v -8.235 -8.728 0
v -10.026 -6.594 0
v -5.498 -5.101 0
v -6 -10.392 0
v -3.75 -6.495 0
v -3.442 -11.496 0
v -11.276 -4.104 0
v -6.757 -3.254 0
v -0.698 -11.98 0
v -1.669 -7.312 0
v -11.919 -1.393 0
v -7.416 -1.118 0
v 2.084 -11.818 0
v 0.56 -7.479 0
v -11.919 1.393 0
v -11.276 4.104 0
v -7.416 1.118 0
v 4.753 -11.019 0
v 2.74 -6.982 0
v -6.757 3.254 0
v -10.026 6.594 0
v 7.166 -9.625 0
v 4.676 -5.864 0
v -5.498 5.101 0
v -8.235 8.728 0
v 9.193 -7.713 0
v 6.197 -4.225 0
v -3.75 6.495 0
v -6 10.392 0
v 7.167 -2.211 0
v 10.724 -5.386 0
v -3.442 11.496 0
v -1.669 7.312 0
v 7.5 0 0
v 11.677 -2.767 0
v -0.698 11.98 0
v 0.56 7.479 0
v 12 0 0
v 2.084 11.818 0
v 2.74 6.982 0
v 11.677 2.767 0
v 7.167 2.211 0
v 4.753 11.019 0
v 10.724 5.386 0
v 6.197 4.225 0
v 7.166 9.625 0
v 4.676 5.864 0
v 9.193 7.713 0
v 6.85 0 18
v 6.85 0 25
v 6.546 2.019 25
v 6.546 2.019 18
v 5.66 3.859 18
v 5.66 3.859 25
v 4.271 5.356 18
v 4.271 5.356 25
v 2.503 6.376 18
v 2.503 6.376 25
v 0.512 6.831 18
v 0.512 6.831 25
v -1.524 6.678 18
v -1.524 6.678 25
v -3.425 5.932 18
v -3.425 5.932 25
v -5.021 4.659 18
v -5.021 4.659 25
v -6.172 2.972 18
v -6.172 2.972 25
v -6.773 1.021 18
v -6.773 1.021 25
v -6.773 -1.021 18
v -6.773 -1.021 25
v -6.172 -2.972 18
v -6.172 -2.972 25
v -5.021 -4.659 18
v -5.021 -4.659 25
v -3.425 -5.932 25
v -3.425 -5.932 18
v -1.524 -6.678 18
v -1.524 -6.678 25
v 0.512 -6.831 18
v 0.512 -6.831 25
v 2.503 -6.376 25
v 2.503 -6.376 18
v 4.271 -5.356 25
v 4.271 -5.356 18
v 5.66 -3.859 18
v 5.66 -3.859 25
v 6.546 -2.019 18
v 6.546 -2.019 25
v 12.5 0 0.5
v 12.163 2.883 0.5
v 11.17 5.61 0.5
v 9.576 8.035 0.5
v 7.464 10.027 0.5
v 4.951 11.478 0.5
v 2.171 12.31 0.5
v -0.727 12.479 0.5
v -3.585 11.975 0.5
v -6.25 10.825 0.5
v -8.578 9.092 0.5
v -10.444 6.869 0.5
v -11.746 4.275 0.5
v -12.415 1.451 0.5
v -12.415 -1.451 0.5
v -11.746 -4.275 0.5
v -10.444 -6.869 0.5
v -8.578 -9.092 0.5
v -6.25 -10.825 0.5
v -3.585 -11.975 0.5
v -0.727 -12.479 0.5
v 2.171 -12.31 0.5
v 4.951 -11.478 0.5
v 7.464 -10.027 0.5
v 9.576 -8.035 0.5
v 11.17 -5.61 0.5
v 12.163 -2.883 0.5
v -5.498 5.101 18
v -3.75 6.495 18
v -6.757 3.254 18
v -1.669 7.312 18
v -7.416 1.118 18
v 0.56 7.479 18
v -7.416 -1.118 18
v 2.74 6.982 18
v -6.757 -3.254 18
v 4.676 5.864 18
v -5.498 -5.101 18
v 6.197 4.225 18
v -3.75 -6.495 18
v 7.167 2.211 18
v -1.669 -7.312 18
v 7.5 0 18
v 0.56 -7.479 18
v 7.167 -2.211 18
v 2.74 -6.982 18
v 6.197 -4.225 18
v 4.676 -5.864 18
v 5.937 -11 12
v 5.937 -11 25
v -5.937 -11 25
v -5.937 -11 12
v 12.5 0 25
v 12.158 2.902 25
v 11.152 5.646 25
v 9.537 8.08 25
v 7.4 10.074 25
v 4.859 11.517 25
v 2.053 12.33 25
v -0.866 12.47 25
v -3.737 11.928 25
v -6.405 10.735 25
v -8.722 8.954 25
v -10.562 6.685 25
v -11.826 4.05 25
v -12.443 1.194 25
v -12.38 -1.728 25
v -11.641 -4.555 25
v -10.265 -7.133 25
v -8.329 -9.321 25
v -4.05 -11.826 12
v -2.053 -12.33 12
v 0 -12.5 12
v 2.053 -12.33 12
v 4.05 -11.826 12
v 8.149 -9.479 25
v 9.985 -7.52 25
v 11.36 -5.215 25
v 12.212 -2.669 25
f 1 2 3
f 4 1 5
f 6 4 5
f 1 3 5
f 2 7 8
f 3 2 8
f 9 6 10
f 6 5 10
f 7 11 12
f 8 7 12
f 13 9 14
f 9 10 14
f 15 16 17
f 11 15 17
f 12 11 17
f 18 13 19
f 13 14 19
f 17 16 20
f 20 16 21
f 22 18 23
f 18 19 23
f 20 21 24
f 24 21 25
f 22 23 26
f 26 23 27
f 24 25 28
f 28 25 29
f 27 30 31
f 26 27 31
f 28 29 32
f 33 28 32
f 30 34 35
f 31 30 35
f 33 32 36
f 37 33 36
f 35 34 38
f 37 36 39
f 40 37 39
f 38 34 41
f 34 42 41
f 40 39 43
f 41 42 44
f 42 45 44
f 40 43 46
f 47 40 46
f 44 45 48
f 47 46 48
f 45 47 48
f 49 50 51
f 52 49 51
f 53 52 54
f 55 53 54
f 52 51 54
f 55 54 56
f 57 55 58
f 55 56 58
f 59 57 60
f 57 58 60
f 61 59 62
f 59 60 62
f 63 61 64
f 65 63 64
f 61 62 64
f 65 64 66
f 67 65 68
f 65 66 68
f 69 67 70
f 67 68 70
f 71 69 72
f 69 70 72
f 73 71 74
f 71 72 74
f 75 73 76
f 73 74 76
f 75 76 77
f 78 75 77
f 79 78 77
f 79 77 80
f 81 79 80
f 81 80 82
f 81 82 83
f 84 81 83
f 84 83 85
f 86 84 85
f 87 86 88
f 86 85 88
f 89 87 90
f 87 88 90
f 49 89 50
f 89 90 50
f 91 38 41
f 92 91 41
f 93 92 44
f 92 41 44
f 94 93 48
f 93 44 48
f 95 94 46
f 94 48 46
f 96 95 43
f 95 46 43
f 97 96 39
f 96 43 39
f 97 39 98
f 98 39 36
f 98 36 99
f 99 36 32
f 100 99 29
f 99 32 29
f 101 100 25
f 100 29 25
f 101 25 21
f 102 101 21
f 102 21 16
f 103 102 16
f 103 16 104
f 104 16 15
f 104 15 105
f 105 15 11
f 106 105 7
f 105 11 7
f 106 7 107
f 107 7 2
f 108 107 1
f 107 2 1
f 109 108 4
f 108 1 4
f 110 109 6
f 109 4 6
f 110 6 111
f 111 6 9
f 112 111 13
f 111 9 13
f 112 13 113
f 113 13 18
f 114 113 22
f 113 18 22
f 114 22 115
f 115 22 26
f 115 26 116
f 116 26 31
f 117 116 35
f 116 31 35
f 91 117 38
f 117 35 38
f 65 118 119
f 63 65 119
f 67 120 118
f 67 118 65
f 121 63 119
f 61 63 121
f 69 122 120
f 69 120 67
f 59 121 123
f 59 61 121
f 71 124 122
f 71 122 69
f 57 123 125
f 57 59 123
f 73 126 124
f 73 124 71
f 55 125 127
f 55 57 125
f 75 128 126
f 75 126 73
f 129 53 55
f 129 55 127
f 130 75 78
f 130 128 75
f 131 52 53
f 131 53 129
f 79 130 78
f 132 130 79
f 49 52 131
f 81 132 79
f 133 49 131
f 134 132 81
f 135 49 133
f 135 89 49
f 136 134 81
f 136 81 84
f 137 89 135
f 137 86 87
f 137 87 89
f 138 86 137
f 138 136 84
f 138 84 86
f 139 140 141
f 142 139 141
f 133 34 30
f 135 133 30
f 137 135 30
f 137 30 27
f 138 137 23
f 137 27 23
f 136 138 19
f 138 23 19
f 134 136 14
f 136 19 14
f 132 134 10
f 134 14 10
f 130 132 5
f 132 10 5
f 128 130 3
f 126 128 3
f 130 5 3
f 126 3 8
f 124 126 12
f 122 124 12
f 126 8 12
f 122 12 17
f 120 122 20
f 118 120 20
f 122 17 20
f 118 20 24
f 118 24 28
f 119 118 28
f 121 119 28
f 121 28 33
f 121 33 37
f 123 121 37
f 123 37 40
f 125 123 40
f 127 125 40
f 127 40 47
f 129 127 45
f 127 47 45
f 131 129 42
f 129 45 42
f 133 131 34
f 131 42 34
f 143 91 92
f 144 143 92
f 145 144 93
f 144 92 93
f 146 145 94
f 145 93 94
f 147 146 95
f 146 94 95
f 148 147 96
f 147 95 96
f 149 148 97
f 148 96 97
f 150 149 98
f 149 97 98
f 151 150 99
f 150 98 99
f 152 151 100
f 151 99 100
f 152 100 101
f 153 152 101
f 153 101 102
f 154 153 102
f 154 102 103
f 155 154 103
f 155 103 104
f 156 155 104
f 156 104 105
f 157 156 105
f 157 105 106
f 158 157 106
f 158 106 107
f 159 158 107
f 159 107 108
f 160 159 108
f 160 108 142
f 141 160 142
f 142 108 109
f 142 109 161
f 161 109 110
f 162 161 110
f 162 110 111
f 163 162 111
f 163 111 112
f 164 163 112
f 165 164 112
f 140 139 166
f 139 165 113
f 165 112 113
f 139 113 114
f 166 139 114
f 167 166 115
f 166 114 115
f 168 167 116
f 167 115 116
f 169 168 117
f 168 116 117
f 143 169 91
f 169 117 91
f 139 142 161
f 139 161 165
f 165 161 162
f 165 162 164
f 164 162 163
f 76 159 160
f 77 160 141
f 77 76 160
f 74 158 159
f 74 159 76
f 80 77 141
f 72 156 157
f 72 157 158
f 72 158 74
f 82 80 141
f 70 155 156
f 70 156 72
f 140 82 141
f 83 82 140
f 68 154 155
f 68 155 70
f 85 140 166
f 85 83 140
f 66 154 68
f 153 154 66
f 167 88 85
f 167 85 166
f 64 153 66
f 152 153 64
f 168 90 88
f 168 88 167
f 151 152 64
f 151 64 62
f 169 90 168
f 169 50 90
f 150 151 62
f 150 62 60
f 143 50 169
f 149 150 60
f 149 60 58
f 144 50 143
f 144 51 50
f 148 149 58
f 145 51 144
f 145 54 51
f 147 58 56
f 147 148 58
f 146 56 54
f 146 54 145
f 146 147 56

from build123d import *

# Parameters (mm, degrees)
F0_R     = 12.5
F1_DEPTH = 25
F2_R     = 7.5
F3_DEPTH = 18
F4_R     = 6.85
F5_DEPTH = 7
F7_DEPTH = 13
F8_SIZE  = 0.5


with BuildPart() as f1:
    # F0 (on Top) → F1 (new body)
    with BuildSketch(Plane.XY):
        Circle(F0_R)
    extrude(amount=F1_DEPTH)

    # F2 (on face) → F3 (cut)
    with BuildSketch(Plane(origin=(0, 0, 0), x_dir=(1, 0, 0), z_dir=(0, 0, -1))):
        Circle(F2_R)
    extrude(amount=-F3_DEPTH, mode=Mode.SUBTRACT)

    # F4 (on face) → F5 (cut)
    with BuildSketch(Plane.XY.offset(25)):
        Circle(F4_R)
    extrude(amount=-F5_DEPTH, mode=Mode.SUBTRACT)

    # F6 (on face) → F7 (cut)
    with BuildSketch(Plane.XY.offset(25)):
        with BuildLine():
            ThreePointArc((-5.9371710435, -11), (-3.0618621785, -12.1191996435), (0, -12.5))
            Line((0, -12.5), (0, -11))
            Line((0, -11), (-5.9371710435, -11))
        make_face()
        with BuildLine():
            Line((0, -11), (0, -12.5))
            ThreePointArc((0, -12.5), (3.0618621785, -12.1191996435), (5.9371710435, -11))
            Line((5.9371710435, -11), (0, -11))
        make_face()
    extrude(amount=-F7_DEPTH, mode=Mode.SUBTRACT)

    # F8
    f8_edges = [f1.edges().sort_by_distance(p)[0] for p in [
        (-12.5, 0, 0),
    ]]
    chamfer(f8_edges, length=F8_SIZE)


solid = f1.part
